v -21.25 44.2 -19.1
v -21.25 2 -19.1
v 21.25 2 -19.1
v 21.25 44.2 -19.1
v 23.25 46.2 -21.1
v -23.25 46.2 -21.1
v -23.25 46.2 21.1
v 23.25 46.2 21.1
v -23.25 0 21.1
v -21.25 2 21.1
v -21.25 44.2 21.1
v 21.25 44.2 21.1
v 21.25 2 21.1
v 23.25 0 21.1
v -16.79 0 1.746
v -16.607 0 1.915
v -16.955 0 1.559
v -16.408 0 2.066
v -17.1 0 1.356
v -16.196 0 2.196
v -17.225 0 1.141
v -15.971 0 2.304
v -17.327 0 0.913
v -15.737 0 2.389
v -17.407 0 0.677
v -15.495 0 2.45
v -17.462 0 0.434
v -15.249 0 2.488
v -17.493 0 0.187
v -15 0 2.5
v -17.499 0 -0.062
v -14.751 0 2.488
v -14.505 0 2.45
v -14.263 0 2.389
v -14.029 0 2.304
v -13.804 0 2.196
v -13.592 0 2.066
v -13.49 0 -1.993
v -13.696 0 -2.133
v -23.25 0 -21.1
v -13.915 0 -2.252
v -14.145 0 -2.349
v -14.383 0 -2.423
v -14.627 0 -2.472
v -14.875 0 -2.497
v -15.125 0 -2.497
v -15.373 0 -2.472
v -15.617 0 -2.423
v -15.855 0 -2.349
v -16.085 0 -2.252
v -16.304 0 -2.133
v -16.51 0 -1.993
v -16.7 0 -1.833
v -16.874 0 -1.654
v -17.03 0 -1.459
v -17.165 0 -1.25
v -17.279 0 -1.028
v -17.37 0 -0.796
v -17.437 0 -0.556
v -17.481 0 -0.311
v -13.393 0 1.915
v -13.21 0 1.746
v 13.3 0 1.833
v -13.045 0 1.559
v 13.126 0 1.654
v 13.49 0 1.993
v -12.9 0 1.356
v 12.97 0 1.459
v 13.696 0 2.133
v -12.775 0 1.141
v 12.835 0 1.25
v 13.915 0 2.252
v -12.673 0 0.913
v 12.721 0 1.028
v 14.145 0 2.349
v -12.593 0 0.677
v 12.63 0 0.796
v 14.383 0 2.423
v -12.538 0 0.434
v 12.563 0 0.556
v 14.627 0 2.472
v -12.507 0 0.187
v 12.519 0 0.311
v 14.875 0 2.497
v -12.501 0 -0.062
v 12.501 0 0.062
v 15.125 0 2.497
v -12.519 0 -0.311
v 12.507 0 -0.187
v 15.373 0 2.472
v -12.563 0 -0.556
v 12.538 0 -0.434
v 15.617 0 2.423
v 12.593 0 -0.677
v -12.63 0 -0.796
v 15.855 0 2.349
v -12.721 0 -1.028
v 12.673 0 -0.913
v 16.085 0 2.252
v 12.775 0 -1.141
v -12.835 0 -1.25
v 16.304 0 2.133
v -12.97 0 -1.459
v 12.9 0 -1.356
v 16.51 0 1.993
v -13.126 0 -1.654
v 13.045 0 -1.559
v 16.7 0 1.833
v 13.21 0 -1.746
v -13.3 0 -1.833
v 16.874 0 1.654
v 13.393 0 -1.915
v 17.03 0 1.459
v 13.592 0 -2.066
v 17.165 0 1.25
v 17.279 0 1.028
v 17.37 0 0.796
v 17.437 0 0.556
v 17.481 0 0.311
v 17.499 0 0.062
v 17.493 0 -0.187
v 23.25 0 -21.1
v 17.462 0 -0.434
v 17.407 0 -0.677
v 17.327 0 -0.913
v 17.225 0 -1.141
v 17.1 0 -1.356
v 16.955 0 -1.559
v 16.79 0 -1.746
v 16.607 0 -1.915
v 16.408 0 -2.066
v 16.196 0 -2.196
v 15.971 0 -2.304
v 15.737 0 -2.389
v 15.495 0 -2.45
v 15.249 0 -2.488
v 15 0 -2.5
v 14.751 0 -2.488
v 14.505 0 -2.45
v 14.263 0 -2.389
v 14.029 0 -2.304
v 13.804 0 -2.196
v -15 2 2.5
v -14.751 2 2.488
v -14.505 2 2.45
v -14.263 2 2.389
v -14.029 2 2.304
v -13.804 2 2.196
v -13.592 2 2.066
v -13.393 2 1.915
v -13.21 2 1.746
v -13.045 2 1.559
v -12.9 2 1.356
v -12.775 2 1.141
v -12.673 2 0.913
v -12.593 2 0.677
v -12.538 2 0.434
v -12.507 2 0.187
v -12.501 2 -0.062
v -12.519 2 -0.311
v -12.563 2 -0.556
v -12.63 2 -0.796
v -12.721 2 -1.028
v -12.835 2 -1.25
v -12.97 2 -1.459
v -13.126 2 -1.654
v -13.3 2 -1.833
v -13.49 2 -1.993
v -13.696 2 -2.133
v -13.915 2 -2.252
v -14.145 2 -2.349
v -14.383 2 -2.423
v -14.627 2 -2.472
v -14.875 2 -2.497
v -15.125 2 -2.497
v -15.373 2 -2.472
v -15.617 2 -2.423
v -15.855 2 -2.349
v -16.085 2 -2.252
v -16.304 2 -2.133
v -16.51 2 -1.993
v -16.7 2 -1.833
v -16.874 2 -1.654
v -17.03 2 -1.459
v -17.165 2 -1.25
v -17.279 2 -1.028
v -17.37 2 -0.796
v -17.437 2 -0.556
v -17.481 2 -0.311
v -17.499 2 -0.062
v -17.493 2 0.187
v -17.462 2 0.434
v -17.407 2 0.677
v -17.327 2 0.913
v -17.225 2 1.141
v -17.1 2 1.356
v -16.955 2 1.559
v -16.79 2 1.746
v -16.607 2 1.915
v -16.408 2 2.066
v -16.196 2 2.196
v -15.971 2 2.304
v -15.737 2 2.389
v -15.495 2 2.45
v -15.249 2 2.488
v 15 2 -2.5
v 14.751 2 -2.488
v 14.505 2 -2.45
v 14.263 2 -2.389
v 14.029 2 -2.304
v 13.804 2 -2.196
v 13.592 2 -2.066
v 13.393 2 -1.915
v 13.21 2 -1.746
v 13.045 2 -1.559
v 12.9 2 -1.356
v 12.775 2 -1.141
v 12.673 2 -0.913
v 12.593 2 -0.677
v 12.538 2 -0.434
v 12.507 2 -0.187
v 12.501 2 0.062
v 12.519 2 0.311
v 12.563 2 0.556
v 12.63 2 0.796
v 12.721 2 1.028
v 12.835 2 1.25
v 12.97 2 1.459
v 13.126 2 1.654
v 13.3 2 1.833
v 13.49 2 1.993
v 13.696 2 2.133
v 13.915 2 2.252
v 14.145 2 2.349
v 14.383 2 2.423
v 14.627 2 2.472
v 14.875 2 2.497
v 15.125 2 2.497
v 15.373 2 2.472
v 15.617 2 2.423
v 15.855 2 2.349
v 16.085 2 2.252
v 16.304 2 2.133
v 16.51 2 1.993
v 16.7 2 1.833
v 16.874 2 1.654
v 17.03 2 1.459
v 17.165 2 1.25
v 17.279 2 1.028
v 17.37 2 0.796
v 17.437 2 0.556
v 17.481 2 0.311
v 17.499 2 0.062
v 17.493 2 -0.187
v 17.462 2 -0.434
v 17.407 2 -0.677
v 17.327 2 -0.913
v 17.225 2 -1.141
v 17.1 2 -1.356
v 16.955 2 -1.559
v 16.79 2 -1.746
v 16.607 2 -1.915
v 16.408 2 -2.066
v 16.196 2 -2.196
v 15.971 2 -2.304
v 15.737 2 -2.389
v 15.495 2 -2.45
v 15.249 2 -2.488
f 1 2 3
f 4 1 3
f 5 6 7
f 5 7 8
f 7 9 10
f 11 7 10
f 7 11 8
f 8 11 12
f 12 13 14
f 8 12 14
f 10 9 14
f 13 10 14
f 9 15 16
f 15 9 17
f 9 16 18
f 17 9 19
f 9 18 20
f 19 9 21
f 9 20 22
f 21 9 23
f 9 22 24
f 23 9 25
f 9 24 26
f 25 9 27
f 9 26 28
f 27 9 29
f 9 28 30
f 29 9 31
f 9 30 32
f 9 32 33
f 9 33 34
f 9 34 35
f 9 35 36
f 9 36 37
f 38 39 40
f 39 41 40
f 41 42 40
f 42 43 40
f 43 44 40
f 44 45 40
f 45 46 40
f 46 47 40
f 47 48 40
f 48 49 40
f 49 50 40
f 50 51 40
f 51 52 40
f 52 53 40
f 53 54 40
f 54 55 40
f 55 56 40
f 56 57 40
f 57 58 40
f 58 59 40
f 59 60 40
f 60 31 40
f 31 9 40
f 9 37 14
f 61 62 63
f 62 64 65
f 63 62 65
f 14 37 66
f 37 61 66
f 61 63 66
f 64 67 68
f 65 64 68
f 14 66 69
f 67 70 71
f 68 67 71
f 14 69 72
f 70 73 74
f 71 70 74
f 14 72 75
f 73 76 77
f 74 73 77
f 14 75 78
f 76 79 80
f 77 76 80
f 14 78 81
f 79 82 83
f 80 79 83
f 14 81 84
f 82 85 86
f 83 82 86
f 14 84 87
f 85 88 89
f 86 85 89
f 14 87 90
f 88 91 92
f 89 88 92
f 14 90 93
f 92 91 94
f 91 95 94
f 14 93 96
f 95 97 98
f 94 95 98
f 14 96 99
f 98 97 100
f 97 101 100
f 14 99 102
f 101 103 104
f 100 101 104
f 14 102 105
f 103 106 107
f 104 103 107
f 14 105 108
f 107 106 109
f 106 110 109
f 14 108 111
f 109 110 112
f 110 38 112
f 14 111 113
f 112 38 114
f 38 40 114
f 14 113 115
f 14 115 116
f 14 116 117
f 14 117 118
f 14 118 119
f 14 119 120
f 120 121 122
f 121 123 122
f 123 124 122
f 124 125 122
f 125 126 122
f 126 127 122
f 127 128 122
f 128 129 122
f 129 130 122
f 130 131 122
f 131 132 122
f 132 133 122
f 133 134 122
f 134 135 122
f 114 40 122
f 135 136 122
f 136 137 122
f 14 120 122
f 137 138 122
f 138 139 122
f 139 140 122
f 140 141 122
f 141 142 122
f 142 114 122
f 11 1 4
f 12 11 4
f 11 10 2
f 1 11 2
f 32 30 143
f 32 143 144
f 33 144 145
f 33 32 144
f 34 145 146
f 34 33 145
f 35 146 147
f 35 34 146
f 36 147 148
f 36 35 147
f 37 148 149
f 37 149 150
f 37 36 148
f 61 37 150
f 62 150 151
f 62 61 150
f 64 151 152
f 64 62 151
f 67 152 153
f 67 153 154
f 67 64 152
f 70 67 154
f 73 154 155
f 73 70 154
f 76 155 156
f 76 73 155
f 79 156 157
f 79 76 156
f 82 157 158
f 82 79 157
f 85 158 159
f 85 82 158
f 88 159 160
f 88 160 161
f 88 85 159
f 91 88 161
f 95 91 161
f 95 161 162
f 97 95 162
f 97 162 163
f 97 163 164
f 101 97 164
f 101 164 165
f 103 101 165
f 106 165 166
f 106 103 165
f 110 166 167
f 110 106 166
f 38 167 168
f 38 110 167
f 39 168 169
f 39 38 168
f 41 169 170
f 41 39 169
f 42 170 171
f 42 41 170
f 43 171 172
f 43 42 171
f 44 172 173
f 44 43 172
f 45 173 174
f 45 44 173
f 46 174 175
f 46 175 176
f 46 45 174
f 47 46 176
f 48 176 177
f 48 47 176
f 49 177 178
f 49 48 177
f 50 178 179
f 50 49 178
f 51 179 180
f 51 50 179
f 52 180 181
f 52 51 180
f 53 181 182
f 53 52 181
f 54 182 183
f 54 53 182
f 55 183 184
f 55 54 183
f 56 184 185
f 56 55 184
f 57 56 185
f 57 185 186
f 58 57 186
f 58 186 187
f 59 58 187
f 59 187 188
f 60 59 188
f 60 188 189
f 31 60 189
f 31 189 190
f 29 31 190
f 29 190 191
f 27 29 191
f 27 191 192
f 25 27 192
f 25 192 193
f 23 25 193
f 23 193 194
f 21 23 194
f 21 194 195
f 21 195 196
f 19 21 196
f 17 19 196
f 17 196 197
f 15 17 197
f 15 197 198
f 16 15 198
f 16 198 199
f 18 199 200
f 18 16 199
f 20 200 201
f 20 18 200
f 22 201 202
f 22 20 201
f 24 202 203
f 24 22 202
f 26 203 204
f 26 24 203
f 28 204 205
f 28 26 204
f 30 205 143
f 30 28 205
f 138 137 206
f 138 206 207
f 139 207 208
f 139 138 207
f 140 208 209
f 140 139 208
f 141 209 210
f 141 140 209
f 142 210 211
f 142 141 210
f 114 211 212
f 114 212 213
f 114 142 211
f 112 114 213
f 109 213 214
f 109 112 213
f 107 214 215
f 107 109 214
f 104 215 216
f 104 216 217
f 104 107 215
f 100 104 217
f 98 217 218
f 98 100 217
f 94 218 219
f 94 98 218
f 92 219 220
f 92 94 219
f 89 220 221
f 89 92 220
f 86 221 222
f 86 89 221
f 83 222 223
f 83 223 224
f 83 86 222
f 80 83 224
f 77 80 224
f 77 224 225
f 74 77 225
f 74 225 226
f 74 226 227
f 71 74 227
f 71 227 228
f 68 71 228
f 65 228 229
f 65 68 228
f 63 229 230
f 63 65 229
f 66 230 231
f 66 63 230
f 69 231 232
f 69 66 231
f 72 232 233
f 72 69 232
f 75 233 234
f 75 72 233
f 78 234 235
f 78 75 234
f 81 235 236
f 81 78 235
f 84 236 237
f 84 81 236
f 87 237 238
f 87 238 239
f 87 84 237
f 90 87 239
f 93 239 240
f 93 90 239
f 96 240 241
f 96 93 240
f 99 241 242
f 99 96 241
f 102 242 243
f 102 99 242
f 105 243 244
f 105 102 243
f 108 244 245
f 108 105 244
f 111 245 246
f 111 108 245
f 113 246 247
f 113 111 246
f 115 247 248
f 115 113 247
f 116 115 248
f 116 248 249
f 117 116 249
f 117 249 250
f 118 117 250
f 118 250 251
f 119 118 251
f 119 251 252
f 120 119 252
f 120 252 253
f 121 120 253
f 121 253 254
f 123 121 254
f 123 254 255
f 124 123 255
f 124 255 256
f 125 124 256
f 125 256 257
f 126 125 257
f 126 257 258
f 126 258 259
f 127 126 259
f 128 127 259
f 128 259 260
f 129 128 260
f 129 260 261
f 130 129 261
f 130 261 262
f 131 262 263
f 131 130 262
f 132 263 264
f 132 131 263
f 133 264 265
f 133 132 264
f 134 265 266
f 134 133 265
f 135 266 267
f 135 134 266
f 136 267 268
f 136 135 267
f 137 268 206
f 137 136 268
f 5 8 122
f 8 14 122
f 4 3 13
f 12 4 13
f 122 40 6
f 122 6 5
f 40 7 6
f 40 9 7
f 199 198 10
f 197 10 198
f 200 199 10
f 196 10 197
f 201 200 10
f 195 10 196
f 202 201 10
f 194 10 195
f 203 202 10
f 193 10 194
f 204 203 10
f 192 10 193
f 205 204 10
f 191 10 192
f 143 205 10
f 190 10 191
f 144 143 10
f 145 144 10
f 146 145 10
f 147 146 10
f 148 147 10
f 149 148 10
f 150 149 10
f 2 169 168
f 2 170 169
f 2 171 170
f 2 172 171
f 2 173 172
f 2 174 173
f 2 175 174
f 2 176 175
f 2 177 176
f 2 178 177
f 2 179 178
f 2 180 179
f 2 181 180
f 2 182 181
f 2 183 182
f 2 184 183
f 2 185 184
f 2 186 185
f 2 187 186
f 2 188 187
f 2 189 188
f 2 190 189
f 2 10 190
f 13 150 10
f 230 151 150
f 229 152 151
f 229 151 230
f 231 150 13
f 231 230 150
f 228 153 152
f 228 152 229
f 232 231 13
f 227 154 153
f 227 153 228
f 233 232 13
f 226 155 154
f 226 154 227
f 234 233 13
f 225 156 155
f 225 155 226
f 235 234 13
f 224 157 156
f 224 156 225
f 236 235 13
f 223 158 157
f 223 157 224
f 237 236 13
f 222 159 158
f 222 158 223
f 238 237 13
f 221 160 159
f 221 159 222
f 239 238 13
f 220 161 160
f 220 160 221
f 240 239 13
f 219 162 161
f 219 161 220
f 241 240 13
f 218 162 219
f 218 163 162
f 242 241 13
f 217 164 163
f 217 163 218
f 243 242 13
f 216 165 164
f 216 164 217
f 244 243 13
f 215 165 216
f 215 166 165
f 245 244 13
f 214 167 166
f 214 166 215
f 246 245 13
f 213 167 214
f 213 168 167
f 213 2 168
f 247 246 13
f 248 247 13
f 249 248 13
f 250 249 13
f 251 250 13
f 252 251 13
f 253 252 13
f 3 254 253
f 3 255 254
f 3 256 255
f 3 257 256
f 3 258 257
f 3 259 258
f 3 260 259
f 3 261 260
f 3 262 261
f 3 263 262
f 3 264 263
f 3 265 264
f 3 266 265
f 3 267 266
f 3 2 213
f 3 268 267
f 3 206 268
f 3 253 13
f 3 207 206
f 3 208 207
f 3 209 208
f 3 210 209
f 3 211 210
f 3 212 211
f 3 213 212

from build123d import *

# Parameters (mm, degrees)
SKETCH2_W           = 46.5
SKETCH2_H           = 42.2
SKETCH2_R           = 2.5
BOSS_EXTRUDE1_DEPTH = 2
BOSS_EXTRUDE2_DEPTH = 42.2
SKETCH4_W           = 46.5
SKETCH4_H           = 42.2
BOSS_EXTRUDE3_DEPTH = 2


with BuildPart() as part:
    # Sketch2 → Boss-Extrude1 (new body)
    with BuildSketch(Plane(origin=(0, 0, 0), x_dir=(1, 0, 0), z_dir=(0, 1, 0))):
        Rectangle(SKETCH2_W, SKETCH2_H)
        with Locations(Location((-15, 0, 0), (0, 0, 270))):
            Circle(SKETCH2_R, mode=Mode.SUBTRACT)
        with Locations(Location((15, 0, 0), (0, 0, 90))):
            Circle(SKETCH2_R, mode=Mode.SUBTRACT)
    extrude(amount=BOSS_EXTRUDE1_DEPTH)

    # Sketch3 → Boss-Extrude2 (add)
    with BuildSketch(Plane(origin=(0, 2, 0), x_dir=(1, 0, 0), z_dir=(0, 1, 0))):
        Polygon((-23.25, -21.1), (-21.25, -21.1), (-21.25, 19.1), (21.25, 19.1), (21.25, -21.1), (23.25, -21.1), (23.25, 21.1), (-23.25, 21.1), align=None)
    extrude(amount=BOSS_EXTRUDE2_DEPTH)

    # Sketch4 → Boss-Extrude3 (add)
    with BuildSketch(Plane(origin=(0, 44.2, 0), x_dir=(1, 0, 0), z_dir=(0, 1, 0))):
        Rectangle(SKETCH4_W, SKETCH4_H)
    extrude(amount=BOSS_EXTRUDE3_DEPTH)


solid = part.part
